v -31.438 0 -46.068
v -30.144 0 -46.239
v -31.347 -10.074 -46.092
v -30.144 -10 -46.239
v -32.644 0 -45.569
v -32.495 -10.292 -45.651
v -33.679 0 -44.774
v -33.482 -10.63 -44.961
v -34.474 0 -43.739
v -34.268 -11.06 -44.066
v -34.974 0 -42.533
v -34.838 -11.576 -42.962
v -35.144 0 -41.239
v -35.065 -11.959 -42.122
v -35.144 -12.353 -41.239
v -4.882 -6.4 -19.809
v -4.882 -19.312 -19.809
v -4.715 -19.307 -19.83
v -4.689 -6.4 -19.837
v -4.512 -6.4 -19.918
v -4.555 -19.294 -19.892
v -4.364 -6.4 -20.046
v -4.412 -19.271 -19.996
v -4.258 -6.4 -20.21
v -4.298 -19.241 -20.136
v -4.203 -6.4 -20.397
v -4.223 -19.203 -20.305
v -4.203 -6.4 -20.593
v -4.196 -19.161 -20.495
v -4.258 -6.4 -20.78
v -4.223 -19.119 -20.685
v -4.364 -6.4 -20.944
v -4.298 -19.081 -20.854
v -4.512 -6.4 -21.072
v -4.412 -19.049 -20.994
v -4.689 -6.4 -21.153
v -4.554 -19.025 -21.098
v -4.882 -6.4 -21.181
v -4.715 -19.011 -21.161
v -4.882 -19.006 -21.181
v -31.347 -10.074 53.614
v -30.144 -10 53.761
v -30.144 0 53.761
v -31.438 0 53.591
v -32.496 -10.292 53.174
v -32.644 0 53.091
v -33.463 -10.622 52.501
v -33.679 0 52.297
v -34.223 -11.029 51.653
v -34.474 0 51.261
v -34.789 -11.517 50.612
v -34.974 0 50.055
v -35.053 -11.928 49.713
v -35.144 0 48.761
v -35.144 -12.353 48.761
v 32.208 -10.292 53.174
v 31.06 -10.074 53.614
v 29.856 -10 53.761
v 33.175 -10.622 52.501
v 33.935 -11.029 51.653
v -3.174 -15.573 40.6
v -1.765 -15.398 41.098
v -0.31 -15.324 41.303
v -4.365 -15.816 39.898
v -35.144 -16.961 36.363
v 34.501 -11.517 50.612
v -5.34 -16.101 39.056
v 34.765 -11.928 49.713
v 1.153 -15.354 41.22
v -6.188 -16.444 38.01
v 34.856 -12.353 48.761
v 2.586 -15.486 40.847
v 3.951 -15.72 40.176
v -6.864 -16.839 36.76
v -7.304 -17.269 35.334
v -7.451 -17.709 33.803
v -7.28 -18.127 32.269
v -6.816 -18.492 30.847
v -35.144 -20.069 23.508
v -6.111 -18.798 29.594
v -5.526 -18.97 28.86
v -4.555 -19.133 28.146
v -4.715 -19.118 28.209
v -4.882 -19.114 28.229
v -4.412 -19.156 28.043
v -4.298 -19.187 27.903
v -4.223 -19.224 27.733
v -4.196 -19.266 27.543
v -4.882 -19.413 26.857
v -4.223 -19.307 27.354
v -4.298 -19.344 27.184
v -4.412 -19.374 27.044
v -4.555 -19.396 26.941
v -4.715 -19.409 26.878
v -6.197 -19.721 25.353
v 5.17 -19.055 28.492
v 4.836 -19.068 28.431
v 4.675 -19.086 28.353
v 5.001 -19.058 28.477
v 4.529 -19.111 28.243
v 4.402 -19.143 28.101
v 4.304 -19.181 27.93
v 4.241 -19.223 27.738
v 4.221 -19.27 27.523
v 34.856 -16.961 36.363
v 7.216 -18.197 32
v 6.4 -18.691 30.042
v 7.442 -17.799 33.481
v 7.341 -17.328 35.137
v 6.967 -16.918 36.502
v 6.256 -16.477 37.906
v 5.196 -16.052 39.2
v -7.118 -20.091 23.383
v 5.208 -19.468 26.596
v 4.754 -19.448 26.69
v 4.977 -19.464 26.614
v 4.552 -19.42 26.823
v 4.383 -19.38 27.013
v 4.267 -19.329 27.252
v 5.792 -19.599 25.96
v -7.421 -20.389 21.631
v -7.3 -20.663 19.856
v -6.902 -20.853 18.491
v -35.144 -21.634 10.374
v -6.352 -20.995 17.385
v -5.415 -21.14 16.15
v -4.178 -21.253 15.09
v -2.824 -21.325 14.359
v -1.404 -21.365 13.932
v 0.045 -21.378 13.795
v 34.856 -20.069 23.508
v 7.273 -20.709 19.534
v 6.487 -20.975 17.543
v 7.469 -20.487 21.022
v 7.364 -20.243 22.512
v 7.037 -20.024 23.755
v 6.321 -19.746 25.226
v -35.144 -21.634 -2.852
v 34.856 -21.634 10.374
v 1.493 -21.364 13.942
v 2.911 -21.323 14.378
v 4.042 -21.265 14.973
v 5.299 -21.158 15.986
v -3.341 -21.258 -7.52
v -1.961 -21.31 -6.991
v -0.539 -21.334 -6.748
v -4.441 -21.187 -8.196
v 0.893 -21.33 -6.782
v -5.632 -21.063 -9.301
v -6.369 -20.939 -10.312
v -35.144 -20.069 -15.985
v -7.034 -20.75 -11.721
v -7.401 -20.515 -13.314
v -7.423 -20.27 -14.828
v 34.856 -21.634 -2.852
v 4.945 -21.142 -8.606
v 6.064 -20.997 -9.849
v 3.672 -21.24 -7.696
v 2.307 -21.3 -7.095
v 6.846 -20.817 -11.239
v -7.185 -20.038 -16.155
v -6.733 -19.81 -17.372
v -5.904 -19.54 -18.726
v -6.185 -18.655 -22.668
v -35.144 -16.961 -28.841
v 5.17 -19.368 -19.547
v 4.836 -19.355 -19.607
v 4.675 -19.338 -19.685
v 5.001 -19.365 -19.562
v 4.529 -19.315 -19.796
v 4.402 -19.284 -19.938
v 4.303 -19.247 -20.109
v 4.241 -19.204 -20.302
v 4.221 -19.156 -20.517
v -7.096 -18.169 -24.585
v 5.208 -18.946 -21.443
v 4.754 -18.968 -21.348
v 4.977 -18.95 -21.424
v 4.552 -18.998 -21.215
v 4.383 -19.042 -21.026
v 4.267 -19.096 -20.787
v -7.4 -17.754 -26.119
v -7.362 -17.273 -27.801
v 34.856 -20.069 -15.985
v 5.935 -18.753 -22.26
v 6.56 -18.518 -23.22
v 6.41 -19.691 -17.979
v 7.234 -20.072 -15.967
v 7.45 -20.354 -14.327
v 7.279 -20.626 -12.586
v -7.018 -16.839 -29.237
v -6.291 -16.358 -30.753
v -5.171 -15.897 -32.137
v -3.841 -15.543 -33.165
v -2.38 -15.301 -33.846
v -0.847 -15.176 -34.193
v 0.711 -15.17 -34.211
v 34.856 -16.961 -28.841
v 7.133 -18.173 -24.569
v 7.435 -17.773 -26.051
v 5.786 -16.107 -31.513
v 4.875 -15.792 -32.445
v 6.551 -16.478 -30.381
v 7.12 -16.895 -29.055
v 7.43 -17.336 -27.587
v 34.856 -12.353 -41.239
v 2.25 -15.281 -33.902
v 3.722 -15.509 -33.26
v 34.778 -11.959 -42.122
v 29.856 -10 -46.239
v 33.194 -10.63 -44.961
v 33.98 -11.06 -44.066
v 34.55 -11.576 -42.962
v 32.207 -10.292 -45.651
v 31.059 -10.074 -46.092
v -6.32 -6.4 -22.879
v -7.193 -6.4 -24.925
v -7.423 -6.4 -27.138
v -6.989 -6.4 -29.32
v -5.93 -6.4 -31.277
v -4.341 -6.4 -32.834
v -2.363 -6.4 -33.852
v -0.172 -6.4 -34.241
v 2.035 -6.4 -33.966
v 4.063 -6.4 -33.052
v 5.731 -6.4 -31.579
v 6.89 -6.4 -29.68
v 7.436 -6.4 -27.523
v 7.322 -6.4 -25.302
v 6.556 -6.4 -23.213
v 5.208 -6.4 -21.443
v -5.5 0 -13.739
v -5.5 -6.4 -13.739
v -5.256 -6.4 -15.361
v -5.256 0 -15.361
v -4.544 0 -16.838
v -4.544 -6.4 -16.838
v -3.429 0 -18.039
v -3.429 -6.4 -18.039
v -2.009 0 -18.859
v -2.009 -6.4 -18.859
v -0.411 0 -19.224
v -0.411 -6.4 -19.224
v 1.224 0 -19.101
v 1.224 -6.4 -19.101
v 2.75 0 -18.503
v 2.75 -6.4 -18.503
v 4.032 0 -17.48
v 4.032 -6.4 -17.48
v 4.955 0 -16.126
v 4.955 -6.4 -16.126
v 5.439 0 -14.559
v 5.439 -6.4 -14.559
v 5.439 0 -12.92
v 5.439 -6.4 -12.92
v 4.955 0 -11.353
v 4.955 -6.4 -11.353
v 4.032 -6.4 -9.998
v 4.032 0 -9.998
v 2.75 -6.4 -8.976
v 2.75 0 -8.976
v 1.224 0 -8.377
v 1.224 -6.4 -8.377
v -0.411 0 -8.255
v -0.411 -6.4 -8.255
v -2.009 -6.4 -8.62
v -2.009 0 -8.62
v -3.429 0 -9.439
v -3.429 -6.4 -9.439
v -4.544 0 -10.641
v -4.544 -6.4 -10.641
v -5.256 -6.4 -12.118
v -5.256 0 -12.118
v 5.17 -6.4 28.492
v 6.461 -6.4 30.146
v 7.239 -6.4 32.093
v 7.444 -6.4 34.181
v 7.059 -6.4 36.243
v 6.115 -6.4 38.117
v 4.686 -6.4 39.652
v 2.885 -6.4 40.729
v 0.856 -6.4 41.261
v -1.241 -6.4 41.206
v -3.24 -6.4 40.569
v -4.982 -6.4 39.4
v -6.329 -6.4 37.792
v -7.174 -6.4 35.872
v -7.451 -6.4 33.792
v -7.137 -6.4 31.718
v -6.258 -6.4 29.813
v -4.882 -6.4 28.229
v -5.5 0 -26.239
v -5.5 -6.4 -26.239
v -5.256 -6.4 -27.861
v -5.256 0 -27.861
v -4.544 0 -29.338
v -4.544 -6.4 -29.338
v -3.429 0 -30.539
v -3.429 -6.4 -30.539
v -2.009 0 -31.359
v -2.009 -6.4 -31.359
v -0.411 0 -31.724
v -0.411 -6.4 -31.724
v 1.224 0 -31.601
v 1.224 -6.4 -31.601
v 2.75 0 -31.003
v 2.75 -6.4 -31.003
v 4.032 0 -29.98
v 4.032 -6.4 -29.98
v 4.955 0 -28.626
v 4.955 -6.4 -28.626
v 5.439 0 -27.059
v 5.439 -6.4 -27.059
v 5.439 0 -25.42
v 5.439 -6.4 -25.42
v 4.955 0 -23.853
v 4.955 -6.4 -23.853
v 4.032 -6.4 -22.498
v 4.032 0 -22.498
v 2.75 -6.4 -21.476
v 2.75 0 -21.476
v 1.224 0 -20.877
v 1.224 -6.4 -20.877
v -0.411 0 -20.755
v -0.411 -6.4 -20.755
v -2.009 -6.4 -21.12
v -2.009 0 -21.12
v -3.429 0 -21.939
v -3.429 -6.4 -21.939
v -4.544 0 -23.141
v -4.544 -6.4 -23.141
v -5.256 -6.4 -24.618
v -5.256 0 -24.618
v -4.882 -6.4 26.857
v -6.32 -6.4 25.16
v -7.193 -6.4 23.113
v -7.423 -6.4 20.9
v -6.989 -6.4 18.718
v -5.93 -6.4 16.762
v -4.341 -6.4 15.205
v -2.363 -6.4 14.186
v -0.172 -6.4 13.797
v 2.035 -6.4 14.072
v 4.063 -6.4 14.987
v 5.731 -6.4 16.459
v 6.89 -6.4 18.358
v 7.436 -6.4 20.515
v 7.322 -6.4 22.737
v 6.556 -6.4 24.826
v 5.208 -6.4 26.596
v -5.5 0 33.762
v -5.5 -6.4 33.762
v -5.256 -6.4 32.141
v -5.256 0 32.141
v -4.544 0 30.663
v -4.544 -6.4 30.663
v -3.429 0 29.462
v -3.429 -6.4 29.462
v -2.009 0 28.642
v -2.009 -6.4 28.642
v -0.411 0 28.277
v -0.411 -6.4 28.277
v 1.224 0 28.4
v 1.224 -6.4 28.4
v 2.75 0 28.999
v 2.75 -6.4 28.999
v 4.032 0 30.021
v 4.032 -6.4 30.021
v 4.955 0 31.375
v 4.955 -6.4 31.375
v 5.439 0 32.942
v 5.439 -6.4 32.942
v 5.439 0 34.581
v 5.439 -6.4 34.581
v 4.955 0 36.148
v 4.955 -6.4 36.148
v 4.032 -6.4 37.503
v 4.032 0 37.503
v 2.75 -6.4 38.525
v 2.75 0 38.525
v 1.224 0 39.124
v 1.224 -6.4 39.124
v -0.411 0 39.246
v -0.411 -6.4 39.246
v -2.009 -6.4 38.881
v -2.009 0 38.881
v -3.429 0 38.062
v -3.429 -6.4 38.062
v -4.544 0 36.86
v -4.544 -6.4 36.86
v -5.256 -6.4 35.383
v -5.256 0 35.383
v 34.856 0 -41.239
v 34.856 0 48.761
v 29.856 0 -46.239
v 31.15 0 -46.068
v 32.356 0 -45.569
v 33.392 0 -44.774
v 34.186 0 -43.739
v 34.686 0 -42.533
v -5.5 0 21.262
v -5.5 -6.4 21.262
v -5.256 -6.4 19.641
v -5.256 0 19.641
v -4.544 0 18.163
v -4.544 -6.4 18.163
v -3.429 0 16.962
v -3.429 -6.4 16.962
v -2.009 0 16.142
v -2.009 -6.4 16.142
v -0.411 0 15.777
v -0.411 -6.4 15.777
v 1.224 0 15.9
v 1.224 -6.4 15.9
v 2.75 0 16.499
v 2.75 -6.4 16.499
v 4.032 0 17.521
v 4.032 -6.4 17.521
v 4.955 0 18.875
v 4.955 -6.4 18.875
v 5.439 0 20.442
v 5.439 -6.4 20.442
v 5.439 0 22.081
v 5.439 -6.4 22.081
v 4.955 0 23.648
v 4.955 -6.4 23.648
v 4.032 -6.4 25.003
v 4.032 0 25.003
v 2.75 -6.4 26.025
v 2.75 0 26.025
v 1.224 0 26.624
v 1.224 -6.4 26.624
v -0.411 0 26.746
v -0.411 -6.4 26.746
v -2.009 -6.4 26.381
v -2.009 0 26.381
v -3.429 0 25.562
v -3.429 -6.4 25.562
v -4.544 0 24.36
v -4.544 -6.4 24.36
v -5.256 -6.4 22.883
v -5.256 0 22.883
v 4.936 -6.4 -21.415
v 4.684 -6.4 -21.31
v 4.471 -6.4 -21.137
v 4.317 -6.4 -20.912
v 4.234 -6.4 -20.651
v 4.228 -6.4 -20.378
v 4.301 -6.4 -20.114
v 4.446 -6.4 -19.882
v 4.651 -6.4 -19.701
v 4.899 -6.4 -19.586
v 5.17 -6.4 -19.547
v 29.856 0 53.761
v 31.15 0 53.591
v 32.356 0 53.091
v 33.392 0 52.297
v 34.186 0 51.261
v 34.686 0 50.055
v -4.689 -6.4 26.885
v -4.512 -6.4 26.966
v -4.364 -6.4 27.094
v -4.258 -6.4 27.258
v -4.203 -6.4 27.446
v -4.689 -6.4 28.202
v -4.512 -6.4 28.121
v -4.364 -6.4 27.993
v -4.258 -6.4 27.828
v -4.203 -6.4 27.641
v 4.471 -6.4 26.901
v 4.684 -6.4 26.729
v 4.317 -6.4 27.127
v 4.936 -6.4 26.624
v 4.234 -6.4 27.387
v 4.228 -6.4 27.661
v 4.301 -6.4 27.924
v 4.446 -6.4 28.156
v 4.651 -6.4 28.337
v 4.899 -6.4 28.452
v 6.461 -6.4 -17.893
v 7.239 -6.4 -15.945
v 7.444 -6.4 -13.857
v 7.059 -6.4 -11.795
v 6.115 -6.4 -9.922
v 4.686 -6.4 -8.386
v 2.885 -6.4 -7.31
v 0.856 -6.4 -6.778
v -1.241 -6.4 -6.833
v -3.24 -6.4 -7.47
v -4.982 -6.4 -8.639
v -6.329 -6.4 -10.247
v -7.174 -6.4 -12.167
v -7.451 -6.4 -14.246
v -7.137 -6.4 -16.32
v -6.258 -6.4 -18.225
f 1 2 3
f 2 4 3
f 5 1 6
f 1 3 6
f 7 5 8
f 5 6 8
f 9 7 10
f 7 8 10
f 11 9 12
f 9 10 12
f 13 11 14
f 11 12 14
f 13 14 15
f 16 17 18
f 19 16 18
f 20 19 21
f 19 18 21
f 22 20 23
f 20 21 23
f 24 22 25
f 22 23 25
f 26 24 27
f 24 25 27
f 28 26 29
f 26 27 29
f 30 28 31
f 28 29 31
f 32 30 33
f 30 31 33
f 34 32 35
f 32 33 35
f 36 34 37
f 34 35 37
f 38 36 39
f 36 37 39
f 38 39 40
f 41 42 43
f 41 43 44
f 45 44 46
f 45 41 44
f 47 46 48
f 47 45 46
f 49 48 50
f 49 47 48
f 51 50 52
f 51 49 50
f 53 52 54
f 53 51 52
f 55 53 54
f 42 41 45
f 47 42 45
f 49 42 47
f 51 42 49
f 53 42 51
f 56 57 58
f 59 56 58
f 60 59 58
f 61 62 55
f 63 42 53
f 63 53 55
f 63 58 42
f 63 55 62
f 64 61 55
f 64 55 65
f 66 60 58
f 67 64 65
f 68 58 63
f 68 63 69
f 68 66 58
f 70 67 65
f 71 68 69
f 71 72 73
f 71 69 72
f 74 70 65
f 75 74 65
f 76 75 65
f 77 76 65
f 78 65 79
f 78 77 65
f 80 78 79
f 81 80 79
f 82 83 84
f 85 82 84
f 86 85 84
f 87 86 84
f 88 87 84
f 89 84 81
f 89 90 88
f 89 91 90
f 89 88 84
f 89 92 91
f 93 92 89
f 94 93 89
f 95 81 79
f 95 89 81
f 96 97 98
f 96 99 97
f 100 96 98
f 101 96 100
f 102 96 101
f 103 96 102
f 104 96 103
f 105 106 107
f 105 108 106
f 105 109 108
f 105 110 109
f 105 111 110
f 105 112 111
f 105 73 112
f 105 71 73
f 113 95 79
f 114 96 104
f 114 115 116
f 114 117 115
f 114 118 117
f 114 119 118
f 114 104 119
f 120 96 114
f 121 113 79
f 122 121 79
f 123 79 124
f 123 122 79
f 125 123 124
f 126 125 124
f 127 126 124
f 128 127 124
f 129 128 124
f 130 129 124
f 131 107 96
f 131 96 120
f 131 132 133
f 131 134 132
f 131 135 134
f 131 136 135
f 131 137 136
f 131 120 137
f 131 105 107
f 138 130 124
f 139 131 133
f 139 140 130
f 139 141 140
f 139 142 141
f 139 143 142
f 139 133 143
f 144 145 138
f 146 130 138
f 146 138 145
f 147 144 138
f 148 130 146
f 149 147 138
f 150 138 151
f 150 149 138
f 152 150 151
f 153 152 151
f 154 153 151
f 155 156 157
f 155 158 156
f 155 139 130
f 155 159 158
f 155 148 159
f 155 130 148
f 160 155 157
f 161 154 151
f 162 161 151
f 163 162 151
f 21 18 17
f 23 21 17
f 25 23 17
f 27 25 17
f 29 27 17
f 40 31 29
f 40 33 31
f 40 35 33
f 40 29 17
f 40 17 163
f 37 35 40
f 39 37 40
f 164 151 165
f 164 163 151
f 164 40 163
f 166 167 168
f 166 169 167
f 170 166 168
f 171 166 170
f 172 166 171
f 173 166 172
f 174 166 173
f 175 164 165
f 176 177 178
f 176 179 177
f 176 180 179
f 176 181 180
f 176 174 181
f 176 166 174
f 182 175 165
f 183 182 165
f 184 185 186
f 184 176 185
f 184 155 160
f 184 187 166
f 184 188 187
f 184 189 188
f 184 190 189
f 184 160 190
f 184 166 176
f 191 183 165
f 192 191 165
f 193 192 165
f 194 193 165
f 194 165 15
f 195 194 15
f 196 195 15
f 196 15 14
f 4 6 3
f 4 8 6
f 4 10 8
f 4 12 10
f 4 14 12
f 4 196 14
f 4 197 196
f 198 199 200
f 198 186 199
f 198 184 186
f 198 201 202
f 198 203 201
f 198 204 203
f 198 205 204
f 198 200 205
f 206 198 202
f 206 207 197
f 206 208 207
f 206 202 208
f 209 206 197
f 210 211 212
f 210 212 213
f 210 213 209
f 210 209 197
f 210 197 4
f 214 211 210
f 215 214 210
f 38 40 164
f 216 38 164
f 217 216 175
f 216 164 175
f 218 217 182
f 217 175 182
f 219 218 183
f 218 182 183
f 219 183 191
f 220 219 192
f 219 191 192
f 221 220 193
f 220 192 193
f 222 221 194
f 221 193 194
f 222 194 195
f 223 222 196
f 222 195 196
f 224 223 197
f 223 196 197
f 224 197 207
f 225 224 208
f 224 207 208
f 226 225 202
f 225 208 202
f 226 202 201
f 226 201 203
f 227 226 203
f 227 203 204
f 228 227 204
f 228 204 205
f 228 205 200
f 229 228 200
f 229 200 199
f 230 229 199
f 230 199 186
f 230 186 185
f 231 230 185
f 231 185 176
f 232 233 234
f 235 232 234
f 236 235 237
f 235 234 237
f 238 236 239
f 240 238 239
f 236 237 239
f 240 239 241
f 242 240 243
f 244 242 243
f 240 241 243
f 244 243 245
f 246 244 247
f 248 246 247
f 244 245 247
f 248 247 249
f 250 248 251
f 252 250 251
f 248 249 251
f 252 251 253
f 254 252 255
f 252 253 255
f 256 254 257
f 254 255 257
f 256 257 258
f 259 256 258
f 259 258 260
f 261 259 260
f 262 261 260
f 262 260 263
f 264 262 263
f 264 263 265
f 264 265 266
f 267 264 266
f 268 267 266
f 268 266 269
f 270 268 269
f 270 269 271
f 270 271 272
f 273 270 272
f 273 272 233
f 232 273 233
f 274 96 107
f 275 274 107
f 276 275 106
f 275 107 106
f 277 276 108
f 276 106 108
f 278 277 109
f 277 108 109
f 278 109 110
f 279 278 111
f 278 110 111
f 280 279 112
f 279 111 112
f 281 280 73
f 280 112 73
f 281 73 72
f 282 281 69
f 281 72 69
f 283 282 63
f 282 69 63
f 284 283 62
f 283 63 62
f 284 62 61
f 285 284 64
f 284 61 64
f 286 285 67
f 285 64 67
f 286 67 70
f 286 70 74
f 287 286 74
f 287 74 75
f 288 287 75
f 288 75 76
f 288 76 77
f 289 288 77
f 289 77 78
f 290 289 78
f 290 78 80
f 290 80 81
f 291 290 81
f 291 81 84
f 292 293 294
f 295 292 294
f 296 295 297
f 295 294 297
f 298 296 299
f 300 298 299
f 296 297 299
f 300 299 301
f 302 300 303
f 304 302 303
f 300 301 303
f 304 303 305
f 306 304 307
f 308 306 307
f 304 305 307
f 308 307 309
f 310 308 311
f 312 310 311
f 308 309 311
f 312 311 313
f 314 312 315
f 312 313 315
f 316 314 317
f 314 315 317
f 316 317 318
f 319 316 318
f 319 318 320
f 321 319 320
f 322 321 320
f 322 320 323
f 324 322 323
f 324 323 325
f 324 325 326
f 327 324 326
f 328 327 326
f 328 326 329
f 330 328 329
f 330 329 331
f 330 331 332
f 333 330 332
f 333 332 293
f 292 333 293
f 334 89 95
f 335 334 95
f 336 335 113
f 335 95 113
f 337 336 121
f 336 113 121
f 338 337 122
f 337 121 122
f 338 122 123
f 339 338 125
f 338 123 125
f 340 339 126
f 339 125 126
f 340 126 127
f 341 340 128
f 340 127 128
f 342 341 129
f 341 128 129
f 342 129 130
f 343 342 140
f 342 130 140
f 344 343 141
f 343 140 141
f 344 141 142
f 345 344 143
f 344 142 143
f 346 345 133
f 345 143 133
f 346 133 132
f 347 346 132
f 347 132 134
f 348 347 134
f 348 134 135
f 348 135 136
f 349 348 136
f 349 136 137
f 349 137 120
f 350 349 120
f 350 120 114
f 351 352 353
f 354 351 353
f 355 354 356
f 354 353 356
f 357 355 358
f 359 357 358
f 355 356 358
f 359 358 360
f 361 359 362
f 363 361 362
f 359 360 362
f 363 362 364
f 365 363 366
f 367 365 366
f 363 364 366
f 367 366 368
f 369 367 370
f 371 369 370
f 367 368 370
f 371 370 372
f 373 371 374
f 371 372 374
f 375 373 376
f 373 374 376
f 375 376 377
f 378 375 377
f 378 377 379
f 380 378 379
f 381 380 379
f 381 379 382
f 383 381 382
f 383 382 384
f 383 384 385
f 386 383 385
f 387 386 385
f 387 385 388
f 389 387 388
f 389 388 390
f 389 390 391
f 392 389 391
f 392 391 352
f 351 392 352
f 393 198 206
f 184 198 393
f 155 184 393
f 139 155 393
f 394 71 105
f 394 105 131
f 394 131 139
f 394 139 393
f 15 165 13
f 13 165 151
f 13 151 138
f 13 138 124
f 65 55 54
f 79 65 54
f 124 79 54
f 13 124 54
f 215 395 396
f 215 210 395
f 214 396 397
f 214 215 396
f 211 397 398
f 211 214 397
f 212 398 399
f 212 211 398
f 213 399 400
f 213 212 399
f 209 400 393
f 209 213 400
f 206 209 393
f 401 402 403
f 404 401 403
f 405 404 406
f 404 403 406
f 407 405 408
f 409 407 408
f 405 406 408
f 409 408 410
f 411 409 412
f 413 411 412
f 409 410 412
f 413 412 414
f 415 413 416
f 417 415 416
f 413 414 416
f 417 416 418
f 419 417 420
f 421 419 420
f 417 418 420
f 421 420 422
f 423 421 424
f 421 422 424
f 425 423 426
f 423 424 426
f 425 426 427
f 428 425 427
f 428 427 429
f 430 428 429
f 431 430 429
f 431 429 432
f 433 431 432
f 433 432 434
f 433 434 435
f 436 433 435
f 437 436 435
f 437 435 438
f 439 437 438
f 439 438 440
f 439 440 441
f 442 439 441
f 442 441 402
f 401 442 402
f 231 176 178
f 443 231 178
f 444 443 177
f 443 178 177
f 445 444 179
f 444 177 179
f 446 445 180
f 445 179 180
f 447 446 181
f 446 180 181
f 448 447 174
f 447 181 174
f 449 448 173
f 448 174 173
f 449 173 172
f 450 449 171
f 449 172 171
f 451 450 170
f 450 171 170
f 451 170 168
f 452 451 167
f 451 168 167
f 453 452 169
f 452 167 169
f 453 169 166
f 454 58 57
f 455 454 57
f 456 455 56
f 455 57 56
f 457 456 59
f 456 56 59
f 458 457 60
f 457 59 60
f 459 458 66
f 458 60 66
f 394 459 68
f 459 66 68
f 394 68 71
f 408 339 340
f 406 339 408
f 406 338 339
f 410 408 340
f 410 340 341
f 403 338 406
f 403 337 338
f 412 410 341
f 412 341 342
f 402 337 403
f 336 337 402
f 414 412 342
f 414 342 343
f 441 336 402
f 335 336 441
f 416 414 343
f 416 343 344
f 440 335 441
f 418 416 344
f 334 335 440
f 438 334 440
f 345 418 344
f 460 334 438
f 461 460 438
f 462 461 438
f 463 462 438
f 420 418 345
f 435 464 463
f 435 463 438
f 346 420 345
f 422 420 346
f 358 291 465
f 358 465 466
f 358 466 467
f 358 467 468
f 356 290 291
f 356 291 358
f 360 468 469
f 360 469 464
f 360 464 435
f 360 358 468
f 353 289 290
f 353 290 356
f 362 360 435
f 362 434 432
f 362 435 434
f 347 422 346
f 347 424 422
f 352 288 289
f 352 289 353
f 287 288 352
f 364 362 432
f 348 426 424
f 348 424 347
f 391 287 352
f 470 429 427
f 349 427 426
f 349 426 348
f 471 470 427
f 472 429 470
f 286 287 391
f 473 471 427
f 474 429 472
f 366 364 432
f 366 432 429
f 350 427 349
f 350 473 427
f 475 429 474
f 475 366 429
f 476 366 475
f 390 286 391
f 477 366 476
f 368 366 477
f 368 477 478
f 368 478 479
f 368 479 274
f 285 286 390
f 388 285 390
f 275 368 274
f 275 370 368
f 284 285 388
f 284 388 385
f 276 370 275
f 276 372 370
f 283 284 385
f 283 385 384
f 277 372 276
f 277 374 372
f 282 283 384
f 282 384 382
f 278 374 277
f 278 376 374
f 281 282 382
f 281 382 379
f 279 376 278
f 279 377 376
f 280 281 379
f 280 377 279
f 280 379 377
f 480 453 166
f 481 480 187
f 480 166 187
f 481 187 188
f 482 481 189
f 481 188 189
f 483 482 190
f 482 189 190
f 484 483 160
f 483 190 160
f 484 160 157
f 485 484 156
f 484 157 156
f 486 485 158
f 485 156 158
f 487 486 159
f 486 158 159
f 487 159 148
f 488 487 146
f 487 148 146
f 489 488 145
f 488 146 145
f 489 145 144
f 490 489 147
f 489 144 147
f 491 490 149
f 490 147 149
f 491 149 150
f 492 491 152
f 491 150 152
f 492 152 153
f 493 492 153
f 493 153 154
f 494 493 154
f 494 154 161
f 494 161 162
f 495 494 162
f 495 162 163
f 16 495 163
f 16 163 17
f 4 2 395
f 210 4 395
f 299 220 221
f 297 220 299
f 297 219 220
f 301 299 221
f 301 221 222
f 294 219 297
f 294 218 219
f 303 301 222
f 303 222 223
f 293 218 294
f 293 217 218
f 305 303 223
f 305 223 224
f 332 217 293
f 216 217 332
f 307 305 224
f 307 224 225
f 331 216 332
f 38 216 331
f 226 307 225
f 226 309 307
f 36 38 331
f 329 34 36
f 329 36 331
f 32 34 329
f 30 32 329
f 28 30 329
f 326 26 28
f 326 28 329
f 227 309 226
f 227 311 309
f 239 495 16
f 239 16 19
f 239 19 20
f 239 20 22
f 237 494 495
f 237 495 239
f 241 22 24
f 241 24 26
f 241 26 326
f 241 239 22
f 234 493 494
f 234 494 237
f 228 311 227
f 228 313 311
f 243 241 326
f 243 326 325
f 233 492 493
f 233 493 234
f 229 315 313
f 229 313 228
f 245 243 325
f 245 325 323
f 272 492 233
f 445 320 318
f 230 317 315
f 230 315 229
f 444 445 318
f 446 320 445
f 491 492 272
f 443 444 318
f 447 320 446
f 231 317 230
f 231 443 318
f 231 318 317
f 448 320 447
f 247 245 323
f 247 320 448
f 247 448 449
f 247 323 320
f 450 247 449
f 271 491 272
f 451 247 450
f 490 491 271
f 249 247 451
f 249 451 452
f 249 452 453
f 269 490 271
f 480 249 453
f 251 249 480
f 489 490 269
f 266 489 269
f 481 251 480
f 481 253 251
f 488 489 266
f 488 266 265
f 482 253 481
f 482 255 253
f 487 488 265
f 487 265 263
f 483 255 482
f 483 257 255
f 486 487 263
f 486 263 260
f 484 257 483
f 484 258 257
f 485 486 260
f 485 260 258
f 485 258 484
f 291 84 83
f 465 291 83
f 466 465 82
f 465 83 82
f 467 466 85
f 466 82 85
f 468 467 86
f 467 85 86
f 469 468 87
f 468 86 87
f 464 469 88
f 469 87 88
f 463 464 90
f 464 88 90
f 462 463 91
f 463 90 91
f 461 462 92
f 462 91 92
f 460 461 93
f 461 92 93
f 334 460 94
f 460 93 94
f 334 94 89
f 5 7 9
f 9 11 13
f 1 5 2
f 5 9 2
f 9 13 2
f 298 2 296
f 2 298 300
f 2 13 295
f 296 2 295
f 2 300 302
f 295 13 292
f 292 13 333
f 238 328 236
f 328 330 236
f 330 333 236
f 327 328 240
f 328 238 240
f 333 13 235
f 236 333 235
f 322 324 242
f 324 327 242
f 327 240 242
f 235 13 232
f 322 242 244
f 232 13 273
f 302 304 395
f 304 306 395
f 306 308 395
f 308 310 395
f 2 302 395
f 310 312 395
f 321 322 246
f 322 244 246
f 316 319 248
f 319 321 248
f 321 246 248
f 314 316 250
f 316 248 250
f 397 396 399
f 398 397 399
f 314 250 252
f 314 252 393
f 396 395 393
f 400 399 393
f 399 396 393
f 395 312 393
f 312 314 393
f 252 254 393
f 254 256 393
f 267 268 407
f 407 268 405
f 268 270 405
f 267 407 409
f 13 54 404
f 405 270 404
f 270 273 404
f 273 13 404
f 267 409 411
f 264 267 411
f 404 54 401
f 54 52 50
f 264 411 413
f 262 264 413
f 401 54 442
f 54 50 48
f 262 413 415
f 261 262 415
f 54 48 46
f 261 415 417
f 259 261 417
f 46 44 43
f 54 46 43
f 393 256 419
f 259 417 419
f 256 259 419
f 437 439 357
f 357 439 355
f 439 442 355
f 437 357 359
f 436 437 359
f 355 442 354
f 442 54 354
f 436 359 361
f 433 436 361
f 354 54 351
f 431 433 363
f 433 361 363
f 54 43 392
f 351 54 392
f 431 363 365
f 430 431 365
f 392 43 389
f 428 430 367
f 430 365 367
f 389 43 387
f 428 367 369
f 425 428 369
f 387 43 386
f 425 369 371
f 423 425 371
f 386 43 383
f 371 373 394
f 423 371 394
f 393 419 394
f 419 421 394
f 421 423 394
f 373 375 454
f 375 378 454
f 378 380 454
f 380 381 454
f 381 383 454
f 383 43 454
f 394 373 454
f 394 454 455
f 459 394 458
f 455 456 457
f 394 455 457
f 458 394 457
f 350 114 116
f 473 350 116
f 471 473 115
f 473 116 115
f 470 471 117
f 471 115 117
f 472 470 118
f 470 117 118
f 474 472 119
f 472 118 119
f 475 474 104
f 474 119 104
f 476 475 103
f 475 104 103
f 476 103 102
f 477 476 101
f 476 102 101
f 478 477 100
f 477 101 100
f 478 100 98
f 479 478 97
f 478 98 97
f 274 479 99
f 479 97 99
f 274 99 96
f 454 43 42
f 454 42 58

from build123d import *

# Parameters (mm, degrees)
F0_W     = 70
F0_H     = 100
F1_DEPTH = 10
F3_DEPTH = 70
F4_R     = 5
F6_D     = 11
F9_DEPTH = 17.2


with BuildPart() as f1:
    # F0 (on Front) → F1 (new body)
    with BuildSketch(Plane.XZ):
        with Locations((-0.1439042389, 3.7611486804)):
            Rectangle(F0_W, F0_H)
    extrude(amount=F1_DEPTH)

    # F2 (on face) → F3 (join)
    with BuildSketch(Plane.YZ.offset(34.8560957611)):
        with BuildLine():
            Line((-10, -46.2388513196), (-10, 53.7611486804))
            ThreePointArc((-10, 53.7611486804), (-21.8296936781, 3.7611486804), (-10, -46.2388513196))
        make_face()
    extrude(amount=-F3_DEPTH)

    # F4
    f4_edges = [f1.edges().sort_by_distance(p)[0] for p in [
        (34.856096, -5, 53.761149),
        (-35.143904, -5, 53.761149),
        (34.856096, -5, -46.238851),
        (-35.143904, -5, -46.238851),
    ]]
    fillet(f4_edges, radius=F4_R)

    # F6 (through all)
    with Locations(Plane(origin=(0, 0, 0), x_dir=(1, 0, 0), z_dir=(0, 1, 0))):
        with Locations((0, -33.7616663978), (0, -21.2616663978), (0, 13.7393690371), (0, 26.2393690371)):
            Hole(F6_D / 2)

    # F8 (on offset) → F9 (cut)
    with BuildSketch(Plane.XZ.offset(23.6)):
        with BuildLine():
            ThreePointArc((5.1695684419, 28.491923844), (-0.1945076363, 41.3073727185), (-4.8824502155, 28.2294433564))
            ThreePointArc((-4.8824502155, 28.2294433564), (-4.1963299736, 27.5433231145), (-4.8824502155, 26.8572028726))
            ThreePointArc((-4.8824502155, 26.8572028726), (-0.17230498, 13.7974067448), (5.2084099632, 26.5955179234))
            ThreePointArc((5.2084099632, 26.5955179234), (4.2211666178, 27.5238982808), (5.1695684419, 28.491923844))
        make_face()
        with BuildLine():
            ThreePointArc((5.1695684419, -19.5465231666), (-0.1945076363, -6.7310742921), (-4.8824502155, -19.8090036542))
            ThreePointArc((-4.8824502155, -19.8090036542), (-4.1963299736, -20.4951238961), (-4.8824502155, -21.181244138))
            ThreePointArc((-4.8824502155, -21.181244138), (-0.17230498, -34.2410402658), (5.2084099632, -21.4429290872))
            ThreePointArc((5.2084099632, -21.4429290872), (4.2211666178, -20.5145487298), (5.1695684419, -19.5465231666))
        make_face()
    extrude(amount=-F9_DEPTH, mode=Mode.SUBTRACT)


solid = f1.part
